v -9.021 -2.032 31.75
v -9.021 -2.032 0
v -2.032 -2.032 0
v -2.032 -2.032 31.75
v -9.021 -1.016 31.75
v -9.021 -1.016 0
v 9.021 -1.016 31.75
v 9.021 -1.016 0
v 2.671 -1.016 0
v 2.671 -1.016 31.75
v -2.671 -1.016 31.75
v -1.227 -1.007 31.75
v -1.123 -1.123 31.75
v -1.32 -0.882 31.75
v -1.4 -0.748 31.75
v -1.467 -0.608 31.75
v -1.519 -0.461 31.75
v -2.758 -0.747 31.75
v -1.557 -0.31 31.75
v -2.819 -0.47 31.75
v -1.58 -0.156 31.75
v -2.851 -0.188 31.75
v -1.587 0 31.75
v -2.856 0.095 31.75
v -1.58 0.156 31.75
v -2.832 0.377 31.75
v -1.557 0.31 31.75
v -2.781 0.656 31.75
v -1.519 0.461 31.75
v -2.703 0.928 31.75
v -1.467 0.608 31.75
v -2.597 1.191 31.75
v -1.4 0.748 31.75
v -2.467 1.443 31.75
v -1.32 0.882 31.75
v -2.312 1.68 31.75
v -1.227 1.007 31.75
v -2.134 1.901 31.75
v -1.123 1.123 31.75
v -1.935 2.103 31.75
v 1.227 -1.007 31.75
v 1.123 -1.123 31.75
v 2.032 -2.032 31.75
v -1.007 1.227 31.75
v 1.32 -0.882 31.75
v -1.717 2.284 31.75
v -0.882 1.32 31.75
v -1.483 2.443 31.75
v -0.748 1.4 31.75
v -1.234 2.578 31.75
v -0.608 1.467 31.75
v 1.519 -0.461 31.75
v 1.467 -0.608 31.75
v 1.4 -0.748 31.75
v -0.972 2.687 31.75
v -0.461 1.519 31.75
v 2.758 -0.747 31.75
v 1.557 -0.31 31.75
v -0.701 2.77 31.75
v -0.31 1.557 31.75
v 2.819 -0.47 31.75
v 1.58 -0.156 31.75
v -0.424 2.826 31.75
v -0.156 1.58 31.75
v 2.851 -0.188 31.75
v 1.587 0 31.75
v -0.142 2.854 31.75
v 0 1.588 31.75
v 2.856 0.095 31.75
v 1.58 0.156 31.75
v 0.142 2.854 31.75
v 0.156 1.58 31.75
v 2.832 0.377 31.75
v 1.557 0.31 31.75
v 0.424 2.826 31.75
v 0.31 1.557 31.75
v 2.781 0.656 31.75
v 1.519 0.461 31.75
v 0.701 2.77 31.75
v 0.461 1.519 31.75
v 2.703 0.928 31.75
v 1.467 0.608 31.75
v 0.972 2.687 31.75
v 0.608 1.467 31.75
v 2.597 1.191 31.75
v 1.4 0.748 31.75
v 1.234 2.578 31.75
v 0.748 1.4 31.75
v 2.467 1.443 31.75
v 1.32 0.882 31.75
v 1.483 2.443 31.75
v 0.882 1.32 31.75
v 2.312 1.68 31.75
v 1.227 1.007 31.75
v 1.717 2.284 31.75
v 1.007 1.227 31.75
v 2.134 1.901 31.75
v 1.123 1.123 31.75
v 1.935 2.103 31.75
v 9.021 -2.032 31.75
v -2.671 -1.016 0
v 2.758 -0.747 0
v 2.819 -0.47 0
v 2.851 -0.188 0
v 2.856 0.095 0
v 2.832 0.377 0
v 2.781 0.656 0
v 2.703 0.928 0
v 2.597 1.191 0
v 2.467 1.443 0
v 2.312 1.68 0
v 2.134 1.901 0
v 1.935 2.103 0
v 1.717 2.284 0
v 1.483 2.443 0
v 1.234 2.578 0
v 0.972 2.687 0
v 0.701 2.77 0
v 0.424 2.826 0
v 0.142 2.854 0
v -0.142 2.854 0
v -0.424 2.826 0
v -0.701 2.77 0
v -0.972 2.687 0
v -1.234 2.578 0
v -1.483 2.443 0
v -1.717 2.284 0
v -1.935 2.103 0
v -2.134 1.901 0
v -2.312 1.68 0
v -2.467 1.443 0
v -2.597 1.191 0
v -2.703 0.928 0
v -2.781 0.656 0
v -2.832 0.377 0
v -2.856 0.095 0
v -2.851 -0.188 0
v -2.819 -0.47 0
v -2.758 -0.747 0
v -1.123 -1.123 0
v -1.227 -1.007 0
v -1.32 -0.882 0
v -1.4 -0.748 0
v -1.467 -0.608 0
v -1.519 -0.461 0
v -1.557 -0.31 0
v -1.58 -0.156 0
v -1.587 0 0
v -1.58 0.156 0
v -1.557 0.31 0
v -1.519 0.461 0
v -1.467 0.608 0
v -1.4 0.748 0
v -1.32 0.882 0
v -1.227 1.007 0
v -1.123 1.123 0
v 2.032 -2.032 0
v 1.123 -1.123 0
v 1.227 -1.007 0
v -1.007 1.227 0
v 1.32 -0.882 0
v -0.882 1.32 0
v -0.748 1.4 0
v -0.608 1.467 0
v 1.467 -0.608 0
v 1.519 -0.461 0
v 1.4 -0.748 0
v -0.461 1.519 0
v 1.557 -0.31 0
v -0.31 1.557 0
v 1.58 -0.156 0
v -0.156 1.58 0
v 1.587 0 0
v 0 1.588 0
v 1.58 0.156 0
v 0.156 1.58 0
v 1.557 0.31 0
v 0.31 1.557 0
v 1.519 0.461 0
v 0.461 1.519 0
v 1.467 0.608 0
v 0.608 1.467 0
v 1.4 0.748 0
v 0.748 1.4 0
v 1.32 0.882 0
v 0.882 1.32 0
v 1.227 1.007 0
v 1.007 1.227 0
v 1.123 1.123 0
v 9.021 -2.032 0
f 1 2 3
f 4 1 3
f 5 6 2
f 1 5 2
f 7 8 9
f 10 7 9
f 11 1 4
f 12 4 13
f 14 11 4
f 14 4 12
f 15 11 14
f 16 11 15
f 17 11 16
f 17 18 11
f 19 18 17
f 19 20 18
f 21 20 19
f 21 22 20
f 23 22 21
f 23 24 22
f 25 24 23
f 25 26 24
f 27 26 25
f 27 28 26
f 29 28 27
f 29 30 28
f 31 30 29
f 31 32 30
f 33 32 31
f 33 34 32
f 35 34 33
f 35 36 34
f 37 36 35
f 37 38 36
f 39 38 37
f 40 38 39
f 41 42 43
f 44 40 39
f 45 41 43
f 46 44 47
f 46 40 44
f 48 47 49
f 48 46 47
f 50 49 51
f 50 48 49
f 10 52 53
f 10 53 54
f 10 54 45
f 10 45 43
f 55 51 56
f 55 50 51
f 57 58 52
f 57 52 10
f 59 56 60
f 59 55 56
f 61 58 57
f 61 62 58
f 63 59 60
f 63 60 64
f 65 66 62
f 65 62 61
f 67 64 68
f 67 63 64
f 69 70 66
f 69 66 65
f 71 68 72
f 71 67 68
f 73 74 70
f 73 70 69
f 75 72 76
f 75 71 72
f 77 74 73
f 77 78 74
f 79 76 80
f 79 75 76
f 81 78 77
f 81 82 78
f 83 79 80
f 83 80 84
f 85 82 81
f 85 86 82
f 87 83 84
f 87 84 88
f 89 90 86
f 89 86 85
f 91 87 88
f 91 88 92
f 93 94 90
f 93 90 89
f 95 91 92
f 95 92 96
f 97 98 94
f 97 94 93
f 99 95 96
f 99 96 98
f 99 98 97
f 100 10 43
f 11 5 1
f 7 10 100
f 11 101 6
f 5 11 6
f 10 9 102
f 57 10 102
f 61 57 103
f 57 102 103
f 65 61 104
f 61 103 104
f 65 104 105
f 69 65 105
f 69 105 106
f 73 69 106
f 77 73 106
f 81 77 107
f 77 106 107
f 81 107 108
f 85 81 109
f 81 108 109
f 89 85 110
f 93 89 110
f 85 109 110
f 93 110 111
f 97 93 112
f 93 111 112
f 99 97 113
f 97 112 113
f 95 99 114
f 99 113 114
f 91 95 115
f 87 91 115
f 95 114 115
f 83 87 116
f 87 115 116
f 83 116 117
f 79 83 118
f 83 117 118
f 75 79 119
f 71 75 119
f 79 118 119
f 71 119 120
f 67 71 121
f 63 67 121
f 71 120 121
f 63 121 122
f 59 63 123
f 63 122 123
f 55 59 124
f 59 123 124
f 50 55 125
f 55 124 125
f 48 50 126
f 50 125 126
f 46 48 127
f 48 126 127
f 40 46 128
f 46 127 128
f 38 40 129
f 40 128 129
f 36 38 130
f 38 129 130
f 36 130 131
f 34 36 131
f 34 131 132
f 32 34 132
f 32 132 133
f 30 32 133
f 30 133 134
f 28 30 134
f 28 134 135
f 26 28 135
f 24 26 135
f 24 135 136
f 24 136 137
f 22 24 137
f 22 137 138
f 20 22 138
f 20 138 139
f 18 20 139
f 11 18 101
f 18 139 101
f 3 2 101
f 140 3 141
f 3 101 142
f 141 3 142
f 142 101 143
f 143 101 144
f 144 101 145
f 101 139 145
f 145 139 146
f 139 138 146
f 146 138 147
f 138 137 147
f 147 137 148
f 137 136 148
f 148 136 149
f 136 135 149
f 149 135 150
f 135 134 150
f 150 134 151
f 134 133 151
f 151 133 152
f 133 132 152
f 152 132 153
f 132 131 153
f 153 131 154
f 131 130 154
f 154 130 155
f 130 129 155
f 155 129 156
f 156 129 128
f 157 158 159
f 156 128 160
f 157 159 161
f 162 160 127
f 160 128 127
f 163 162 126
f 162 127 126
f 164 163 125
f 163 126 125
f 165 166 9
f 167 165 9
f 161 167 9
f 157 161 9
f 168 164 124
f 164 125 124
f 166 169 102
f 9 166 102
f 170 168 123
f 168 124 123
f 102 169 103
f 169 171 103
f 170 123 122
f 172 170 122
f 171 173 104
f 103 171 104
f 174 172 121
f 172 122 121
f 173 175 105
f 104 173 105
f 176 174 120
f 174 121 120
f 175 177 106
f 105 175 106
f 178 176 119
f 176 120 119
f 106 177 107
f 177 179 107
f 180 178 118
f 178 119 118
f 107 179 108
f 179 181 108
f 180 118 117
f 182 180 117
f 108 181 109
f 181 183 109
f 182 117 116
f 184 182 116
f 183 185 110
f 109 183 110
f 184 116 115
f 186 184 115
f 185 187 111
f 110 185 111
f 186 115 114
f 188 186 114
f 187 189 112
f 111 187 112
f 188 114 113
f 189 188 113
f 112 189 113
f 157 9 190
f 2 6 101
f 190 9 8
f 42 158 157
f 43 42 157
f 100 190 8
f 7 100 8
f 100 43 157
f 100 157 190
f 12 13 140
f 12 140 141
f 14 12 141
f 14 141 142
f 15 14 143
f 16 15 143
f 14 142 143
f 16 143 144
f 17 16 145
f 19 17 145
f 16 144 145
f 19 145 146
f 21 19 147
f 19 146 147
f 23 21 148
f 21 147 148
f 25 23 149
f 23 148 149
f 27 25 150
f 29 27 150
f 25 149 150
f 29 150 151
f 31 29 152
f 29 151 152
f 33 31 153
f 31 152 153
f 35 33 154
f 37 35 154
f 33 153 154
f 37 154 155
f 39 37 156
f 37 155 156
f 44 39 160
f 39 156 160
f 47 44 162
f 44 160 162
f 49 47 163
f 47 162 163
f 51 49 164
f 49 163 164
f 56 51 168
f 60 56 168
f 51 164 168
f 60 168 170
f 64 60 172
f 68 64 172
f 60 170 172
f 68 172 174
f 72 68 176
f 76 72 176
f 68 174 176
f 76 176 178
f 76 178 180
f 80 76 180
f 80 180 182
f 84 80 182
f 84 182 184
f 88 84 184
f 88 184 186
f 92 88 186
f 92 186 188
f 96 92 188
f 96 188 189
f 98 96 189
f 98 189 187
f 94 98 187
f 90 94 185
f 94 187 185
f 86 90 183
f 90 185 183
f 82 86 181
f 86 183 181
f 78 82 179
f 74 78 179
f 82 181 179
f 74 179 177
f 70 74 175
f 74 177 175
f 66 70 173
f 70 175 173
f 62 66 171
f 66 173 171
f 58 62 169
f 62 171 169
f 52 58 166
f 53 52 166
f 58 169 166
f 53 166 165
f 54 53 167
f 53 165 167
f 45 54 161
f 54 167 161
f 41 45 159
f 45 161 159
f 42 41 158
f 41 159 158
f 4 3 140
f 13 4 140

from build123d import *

# Parameters (mm, degrees)
BOSS_EXTRUDE1_DEPTH = 31.75


with BuildPart() as part:
    # Sketch1 → Boss-Extrude1 (new body)
    with BuildSketch(Plane.XY):
        with BuildLine():
            Line((-2.670777087, -1.016), (-9.020777087, -1.016))
            Line((-9.020777087, -1.016), (-9.020777087, -2.032))
            Line((-9.020777087, -2.032), (-2.032, -2.032))
            Line((-2.032, -2.032), (-1.122532015, -1.122532015))
            ThreePointArc((-1.122532015, -1.122532015), (0, 1.5875), (1.122532015, -1.122532015))
            Line((1.122532015, -1.122532015), (2.032, -2.032))
            Line((2.032, -2.032), (9.020777087, -2.032))
            Line((9.020777087, -2.032), (9.020777087, -1.016))
            Line((9.020777087, -1.016), (2.670777087, -1.016))
            ThreePointArc((2.670777087, -1.016), (0, 2.8575), (-2.670777087, -1.016))
        make_face()
    extrude(amount=BOSS_EXTRUDE1_DEPTH)


solid = part.part
